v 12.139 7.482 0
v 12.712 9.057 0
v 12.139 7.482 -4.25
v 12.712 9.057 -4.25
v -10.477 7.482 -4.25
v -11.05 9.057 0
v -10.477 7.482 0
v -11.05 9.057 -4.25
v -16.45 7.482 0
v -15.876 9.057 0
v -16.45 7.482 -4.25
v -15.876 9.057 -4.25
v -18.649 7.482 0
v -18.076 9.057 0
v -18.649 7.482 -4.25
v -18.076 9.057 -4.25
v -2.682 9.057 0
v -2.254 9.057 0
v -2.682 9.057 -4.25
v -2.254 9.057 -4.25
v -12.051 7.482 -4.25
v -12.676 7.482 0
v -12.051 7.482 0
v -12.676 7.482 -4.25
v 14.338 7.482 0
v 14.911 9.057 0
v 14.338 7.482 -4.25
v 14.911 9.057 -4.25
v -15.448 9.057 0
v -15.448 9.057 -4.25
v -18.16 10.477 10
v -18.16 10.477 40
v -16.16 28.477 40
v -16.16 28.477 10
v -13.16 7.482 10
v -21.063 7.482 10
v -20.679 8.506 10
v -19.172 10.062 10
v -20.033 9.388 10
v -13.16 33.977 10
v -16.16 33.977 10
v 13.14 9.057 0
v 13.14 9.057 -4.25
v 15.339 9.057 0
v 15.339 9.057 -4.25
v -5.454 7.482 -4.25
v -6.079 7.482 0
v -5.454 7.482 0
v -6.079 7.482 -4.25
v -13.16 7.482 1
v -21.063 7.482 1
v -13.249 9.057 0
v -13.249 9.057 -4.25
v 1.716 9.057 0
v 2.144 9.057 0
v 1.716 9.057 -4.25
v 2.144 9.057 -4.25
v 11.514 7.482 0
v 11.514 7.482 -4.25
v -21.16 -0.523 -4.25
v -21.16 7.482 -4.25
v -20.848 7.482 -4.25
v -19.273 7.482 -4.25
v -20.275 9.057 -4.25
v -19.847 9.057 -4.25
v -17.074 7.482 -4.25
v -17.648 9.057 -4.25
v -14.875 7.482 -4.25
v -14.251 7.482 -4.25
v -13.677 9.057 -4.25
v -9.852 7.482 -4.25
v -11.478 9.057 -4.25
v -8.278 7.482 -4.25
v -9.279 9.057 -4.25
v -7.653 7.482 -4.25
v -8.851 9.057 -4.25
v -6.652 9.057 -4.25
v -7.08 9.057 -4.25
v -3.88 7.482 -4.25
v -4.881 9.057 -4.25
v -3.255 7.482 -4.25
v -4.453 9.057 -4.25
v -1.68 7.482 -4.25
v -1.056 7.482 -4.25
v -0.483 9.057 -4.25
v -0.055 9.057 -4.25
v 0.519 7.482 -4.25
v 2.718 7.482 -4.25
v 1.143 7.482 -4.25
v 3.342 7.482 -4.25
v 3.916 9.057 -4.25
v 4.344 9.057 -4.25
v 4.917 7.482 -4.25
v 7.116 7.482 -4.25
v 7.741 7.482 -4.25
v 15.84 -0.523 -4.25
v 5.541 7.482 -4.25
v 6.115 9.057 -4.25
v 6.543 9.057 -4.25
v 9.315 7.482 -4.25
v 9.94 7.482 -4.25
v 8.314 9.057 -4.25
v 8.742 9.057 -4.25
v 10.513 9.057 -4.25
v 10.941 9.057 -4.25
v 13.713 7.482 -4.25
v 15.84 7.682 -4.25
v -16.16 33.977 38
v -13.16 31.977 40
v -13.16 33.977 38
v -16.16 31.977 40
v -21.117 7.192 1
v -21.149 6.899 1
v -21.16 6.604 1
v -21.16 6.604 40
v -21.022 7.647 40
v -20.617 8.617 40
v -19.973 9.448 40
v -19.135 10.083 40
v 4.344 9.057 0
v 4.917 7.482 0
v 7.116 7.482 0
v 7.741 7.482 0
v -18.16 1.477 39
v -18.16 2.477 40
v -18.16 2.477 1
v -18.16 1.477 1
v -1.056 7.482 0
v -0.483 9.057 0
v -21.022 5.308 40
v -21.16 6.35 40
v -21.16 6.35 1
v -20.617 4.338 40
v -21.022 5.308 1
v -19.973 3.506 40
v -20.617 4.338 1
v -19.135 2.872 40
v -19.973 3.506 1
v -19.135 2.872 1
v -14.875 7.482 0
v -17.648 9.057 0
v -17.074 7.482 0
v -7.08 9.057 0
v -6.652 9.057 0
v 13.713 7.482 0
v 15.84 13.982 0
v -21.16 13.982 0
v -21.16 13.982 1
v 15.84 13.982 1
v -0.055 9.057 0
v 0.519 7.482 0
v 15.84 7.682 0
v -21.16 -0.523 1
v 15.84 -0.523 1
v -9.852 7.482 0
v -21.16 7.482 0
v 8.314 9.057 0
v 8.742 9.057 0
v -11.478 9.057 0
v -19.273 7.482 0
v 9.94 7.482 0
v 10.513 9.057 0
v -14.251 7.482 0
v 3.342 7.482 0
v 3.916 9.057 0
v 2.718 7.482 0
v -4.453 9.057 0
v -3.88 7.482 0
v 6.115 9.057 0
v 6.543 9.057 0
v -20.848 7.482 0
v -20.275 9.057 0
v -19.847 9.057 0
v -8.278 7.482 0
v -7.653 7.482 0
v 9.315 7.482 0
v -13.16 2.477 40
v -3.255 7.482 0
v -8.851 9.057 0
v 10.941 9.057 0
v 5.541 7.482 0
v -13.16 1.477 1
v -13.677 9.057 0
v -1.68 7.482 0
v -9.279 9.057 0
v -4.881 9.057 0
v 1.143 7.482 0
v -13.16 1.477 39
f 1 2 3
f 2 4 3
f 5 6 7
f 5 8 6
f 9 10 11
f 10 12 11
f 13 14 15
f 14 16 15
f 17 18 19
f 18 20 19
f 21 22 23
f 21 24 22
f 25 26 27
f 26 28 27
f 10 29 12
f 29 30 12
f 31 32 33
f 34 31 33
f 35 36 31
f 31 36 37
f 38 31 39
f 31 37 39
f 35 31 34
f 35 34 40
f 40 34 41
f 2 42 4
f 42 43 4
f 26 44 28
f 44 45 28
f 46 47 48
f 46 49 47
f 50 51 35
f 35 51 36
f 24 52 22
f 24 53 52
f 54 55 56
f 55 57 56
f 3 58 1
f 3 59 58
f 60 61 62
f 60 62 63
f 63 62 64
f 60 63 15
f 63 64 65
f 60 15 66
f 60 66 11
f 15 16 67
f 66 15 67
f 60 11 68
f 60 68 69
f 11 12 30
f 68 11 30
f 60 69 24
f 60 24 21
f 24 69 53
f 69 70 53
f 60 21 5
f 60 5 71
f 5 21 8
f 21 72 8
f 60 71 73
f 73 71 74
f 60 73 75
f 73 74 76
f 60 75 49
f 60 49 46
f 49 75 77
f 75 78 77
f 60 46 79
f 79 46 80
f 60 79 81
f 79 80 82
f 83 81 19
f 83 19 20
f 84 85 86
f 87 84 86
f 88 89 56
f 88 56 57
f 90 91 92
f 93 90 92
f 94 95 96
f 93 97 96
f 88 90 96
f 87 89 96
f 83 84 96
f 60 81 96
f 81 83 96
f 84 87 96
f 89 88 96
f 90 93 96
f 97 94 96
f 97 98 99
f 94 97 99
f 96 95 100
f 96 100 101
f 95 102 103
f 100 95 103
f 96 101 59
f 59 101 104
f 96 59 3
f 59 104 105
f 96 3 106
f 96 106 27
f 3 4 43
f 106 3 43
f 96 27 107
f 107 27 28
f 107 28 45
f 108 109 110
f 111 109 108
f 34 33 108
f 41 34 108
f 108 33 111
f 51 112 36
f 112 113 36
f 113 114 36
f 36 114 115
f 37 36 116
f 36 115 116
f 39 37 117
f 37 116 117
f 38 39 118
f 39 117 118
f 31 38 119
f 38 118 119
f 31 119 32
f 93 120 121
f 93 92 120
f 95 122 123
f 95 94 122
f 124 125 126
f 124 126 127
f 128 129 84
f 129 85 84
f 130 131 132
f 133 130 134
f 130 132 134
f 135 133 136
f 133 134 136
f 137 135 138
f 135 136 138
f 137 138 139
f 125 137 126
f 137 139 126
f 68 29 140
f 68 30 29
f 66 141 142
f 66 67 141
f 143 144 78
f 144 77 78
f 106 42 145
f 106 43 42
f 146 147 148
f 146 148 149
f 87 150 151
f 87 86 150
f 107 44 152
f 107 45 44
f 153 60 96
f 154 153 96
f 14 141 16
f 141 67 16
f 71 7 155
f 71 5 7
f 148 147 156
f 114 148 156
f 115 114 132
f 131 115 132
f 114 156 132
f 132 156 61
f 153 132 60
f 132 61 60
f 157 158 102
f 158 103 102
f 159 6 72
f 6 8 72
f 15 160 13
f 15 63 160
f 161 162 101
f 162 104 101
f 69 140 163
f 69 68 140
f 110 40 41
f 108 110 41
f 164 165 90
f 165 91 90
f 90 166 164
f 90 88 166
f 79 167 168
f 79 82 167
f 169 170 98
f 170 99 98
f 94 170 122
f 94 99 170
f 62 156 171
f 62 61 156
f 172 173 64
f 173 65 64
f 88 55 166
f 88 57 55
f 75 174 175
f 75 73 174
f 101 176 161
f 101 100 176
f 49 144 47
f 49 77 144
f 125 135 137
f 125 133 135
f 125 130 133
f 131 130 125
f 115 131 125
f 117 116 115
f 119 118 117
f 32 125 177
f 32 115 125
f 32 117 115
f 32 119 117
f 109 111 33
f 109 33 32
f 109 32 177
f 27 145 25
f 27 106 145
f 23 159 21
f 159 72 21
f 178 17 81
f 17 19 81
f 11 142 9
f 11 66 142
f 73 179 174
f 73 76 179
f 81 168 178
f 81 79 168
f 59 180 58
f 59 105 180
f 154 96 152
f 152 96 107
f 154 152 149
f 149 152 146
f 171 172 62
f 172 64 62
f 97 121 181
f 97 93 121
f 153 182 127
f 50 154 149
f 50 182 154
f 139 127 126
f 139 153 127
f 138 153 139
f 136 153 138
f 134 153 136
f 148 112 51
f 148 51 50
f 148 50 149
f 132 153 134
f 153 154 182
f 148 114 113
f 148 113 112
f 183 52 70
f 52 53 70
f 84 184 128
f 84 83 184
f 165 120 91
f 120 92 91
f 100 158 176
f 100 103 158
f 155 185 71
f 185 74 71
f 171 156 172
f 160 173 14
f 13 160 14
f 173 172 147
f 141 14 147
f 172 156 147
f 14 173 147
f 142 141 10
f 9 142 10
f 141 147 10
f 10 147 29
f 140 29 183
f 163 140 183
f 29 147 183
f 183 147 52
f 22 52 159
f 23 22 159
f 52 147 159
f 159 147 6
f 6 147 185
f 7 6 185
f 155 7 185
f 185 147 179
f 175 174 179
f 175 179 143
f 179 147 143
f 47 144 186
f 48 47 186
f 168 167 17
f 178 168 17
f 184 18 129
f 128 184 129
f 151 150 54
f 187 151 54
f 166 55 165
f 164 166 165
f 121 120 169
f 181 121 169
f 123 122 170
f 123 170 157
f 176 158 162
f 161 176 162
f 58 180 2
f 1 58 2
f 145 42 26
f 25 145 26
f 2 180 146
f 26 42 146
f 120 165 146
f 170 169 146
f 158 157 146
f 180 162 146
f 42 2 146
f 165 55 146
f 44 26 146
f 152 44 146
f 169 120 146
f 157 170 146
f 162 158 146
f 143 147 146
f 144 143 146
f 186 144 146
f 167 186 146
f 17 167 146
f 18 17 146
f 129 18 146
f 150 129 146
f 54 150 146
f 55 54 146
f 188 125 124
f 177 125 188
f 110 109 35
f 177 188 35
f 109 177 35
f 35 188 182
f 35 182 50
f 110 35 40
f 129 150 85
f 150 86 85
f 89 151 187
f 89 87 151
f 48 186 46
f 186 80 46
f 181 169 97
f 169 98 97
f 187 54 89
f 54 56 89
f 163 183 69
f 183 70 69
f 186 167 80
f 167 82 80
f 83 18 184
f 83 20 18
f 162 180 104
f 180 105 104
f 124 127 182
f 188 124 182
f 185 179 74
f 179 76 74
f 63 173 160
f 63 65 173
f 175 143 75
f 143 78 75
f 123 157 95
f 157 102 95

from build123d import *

# Parameters (mm, degrees)
SKETCH1_W           = 37
SKETCH1_H           = 8.005
SKETCH1_H_2         = 6.5
BOSS_EXTRUDE2_DEPTH = 1
BOSS_EXTRUDE3_DEPTH = 39
SKETCH3_W           = 9
SKETCH3_H           = 26.495
CUT_EXTRUDE1_DEPTH  = 65.214183639
SKETCH5_W           = 5
SKETCH5_H           = 5.5
CUT_EXTRUDE2_DEPTH  = 30
FILLET3_R           = 4
CHAMFER1_SIZE       = 2
SKETCH6_W           = 18.033887542
SKETCH6_H           = 50.935114565
CUT_EXTRUDE3_DEPTH  = 1


with BuildPart() as part:
    # <Rack>-<rack spur rectangular_am-5-solid1>: read off the stored shape, not the designer's step
    # <Rack>-<rack spur rectangular_am-5-solid1>: loft between two sections, ruled curve by curve
    rack_rack_spur_rectangular_am_5_solid1_from = [
        Edge.make_line((-44.536254126, 16.385147548, 25.848409668), (-44.964253225, 16.385147548, 25.848409668)),
        Edge.make_line((-46.735368981, 16.385147548, 25.848409668), (-47.16336808, 16.385147548, 25.848409668)),
        Edge.make_line((-48.934483836, 16.385147548, 25.848409668), (-49.362482935, 16.385147548, 25.848409668)),
        Edge.make_line((-51.133598691, 16.385147548, 25.848409668), (-51.56159779, 16.385147548, 25.848409668)),
        Edge.make_line((-53.332713546, 16.385147548, 25.848409668), (-53.760712645, 16.385147548, 25.848409668)),
        Edge.make_line((-55.531828401, 16.385147548, 25.848409668), (-55.9598275, 16.385147548, 25.848409668)),
        Edge.make_line((-57.730943256, 16.385147548, 25.848409668), (-58.158942355, 16.385147548, 25.848409668)),
        Edge.make_line((-59.930058111, 16.385147548, 25.848409668), (-60.35805721, 16.385147548, 25.848409668)),
        Edge.make_line((-62.129172966, 16.385147548, 25.848409668), (-62.557172065, 16.385147548, 25.848409668)),
        Edge.make_line((-64.328287821, 16.385147548, 25.848409668), (-64.75628692, 16.385147548, 25.848409668)),
        Edge.make_line((-66.527402676, 16.385147548, 25.848409668), (-66.955401775, 16.385147548, 25.848409668)),
        Edge.make_line((-68.726517531, 16.385147548, 25.848409668), (-69.15451663, 16.385147548, 25.848409668)),
        Edge.make_line((-70.925632386, 16.385147548, 25.848409668), (-71.353631485, 16.385147548, 25.848409668)),
        Edge.make_line((-73.124747241, 16.385147548, 25.848409668), (-73.55274634, 16.385147548, 25.848409668)),
        Edge.make_line((-75.323862096, 16.385147548, 25.848409668), (-75.751861195, 16.385147548, 25.848409668)),
        Edge.make_line((-77.522976951, 16.385147548, 25.848409668), (-77.95097605, 16.385147548, 25.848409668)),
        Edge.make_line((-78.836533928, 14.810147548, 25.848409668), (-78.836533928, 6.805147548, 25.848409668)),
        Edge.make_line((-42.337139271, 16.385147548, 25.848409668), (-42.76513837, 16.385147548, 25.848409668)),
        Edge.make_line((-41.836533928, 15.009745672, 25.848409668), (-41.836533928, 6.805147548, 25.848409668)),
        Edge.make_line((-78.836533928, 6.805147548, 25.848409668), (-41.836533928, 6.805147548, 25.848409668)),
        Edge.make_line((-77.95097605, 16.385147548, 25.848409668), (-78.524229169, 14.810147548, 25.848409668)),
        Edge.make_line((-78.836533928, 14.810147548, 25.848409668), (-78.524229169, 14.810147548, 25.848409668)),
        Edge.make_line((-77.522976951, 16.385147548, 25.848409668), (-76.949723832, 14.810147548, 25.848409668)),
        Edge.make_line((-75.751861195, 16.385147548, 25.848409668), (-76.325114314, 14.810147548, 25.848409668)),
        Edge.make_line((-76.949723832, 14.810147548, 25.848409668), (-76.325114314, 14.810147548, 25.848409668)),
        Edge.make_line((-75.323862096, 16.385147548, 25.848409668), (-74.750608977, 14.810147548, 25.848409668)),
        Edge.make_line((-73.55274634, 16.385147548, 25.848409668), (-74.125999459, 14.810147548, 25.848409668)),
        Edge.make_line((-74.750608977, 14.810147548, 25.848409668), (-74.125999459, 14.810147548, 25.848409668)),
        Edge.make_line((-73.124747241, 16.385147548, 25.848409668), (-72.551494122, 14.810147548, 25.848409668)),
        Edge.make_line((-71.353631485, 16.385147548, 25.848409668), (-71.926884604, 14.810147548, 25.848409668)),
        Edge.make_line((-72.551494122, 14.810147548, 25.848409668), (-71.926884604, 14.810147548, 25.848409668)),
        Edge.make_line((-70.925632386, 16.385147548, 25.848409668), (-70.352379267, 14.810147548, 25.848409668)),
        Edge.make_line((-69.15451663, 16.385147548, 25.848409668), (-69.727769749, 14.810147548, 25.848409668)),
        Edge.make_line((-70.352379267, 14.810147548, 25.848409668), (-69.727769749, 14.810147548, 25.848409668)),
        Edge.make_line((-68.726517531, 16.385147548, 25.848409668), (-68.153264412, 14.810147548, 25.848409668)),
        Edge.make_line((-66.955401775, 16.385147548, 25.848409668), (-67.528654894, 14.810147548, 25.848409668)),
        Edge.make_line((-68.153264412, 14.810147548, 25.848409668), (-67.528654894, 14.810147548, 25.848409668)),
        Edge.make_line((-66.527402676, 16.385147548, 25.848409668), (-65.954149557, 14.810147548, 25.848409668)),
        Edge.make_line((-64.75628692, 16.385147548, 25.848409668), (-65.329540039, 14.810147548, 25.848409668)),
        Edge.make_line((-65.954149557, 14.810147548, 25.848409668), (-65.329540039, 14.810147548, 25.848409668)),
        Edge.make_line((-64.328287821, 16.385147548, 25.848409668), (-63.755034702, 14.810147548, 25.848409668)),
        Edge.make_line((-62.557172065, 16.385147548, 25.848409668), (-63.130425184, 14.810147548, 25.848409668)),
        Edge.make_line((-63.755034702, 14.810147548, 25.848409668), (-63.130425184, 14.810147548, 25.848409668)),
        Edge.make_line((-62.129172966, 16.385147548, 25.848409668), (-61.555919847, 14.810147548, 25.848409668)),
        Edge.make_line((-60.35805721, 16.385147548, 25.848409668), (-60.931310329, 14.810147548, 25.848409668)),
        Edge.make_line((-61.555919847, 14.810147548, 25.848409668), (-60.931310329, 14.810147548, 25.848409668)),
        Edge.make_line((-59.930058111, 16.385147548, 25.848409668), (-59.356804992, 14.810147548, 25.848409668)),
        Edge.make_line((-58.158942355, 16.385147548, 25.848409668), (-58.732195474, 14.810147548, 25.848409668)),
        Edge.make_line((-59.356804992, 14.810147548, 25.848409668), (-58.732195474, 14.810147548, 25.848409668)),
        Edge.make_line((-57.730943256, 16.385147548, 25.848409668), (-57.157690137, 14.810147548, 25.848409668)),
        Edge.make_line((-55.9598275, 16.385147548, 25.848409668), (-56.533080619, 14.810147548, 25.848409668)),
        Edge.make_line((-57.157690137, 14.810147548, 25.848409668), (-56.533080619, 14.810147548, 25.848409668)),
        Edge.make_line((-55.531828401, 16.385147548, 25.848409668), (-54.958575282, 14.810147548, 25.848409668)),
        Edge.make_line((-53.760712645, 16.385147548, 25.848409668), (-54.333965764, 14.810147548, 25.848409668)),
        Edge.make_line((-54.958575282, 14.810147548, 25.848409668), (-54.333965764, 14.810147548, 25.848409668)),
        Edge.make_line((-53.332713546, 16.385147548, 25.848409668), (-52.759460427, 14.810147548, 25.848409668)),
        Edge.make_line((-51.56159779, 16.385147548, 25.848409668), (-52.134850909, 14.810147548, 25.848409668)),
        Edge.make_line((-52.759460427, 14.810147548, 25.848409668), (-52.134850909, 14.810147548, 25.848409668)),
        Edge.make_line((-51.133598691, 16.385147548, 25.848409668), (-50.560345572, 14.810147548, 25.848409668)),
        Edge.make_line((-49.362482935, 16.385147548, 25.848409668), (-49.935736054, 14.810147548, 25.848409668)),
        Edge.make_line((-50.560345572, 14.810147548, 25.848409668), (-49.935736054, 14.810147548, 25.848409668)),
        Edge.make_line((-48.934483836, 16.385147548, 25.848409668), (-48.361230717, 14.810147548, 25.848409668)),
        Edge.make_line((-47.16336808, 16.385147548, 25.848409668), (-47.736621199, 14.810147548, 25.848409668)),
        Edge.make_line((-48.361230717, 14.810147548, 25.848409668), (-47.736621199, 14.810147548, 25.848409668)),
        Edge.make_line((-46.735368981, 16.385147548, 25.848409668), (-46.162115862, 14.810147548, 25.848409668)),
        Edge.make_line((-44.964253225, 16.385147548, 25.848409668), (-45.537506344, 14.810147548, 25.848409668)),
        Edge.make_line((-46.162115862, 14.810147548, 25.848409668), (-45.537506344, 14.810147548, 25.848409668)),
        Edge.make_line((-44.536254126, 16.385147548, 25.848409668), (-43.963001007, 14.810147548, 25.848409668)),
        Edge.make_line((-42.76513837, 16.385147548, 25.848409668), (-43.338391489, 14.810147548, 25.848409668)),
        Edge.make_line((-43.963001007, 14.810147548, 25.848409668), (-43.338391489, 14.810147548, 25.848409668)),
        Edge.make_line((-42.337139271, 16.385147548, 25.848409668), (-41.836533928, 15.009745672, 25.848409668)),
    ]
    rack_rack_spur_rectangular_am_5_solid1_to = [
        Edge.make_line((-44.536254126, 16.385147548, 21.598409668), (-44.964253225, 16.385147548, 21.598409668)),
        Edge.make_line((-46.735368981, 16.385147548, 21.598409668), (-47.16336808, 16.385147548, 21.598409668)),
        Edge.make_line((-48.934483836, 16.385147548, 21.598409668), (-49.362482935, 16.385147548, 21.598409668)),
        Edge.make_line((-51.133598691, 16.385147548, 21.598409668), (-51.56159779, 16.385147548, 21.598409668)),
        Edge.make_line((-53.332713546, 16.385147548, 21.598409668), (-53.760712645, 16.385147548, 21.598409668)),
        Edge.make_line((-55.531828401, 16.385147548, 21.598409668), (-55.9598275, 16.385147548, 21.598409668)),
        Edge.make_line((-57.730943256, 16.385147548, 21.598409668), (-58.158942355, 16.385147548, 21.598409668)),
        Edge.make_line((-59.930058111, 16.385147548, 21.598409668), (-60.35805721, 16.385147548, 21.598409668)),
        Edge.make_line((-62.129172966, 16.385147548, 21.598409668), (-62.557172065, 16.385147548, 21.598409668)),
        Edge.make_line((-64.328287821, 16.385147548, 21.598409668), (-64.75628692, 16.385147548, 21.598409668)),
        Edge.make_line((-66.527402676, 16.385147548, 21.598409668), (-66.955401775, 16.385147548, 21.598409668)),
        Edge.make_line((-68.726517531, 16.385147548, 21.598409668), (-69.15451663, 16.385147548, 21.598409668)),
        Edge.make_line((-70.925632386, 16.385147548, 21.598409668), (-71.353631485, 16.385147548, 21.598409668)),
        Edge.make_line((-73.124747241, 16.385147548, 21.598409668), (-73.55274634, 16.385147548, 21.598409668)),
        Edge.make_line((-75.323862096, 16.385147548, 21.598409668), (-75.751861195, 16.385147548, 21.598409668)),
        Edge.make_line((-77.522976951, 16.385147548, 21.598409668), (-77.95097605, 16.385147548, 21.598409668)),
        Edge.make_line((-78.836533928, 14.810147548, 21.598409668), (-78.836533928, 6.805147548, 21.598409668)),
        Edge.make_line((-42.337139271, 16.385147548, 21.598409668), (-42.76513837, 16.385147548, 21.598409668)),
        Edge.make_line((-41.836533928, 15.009745672, 21.598409668), (-41.836533928, 6.805147548, 21.598409668)),
        Edge.make_line((-78.836533928, 6.805147548, 21.598409668), (-41.836533928, 6.805147548, 21.598409668)),
        Edge.make_line((-77.95097605, 16.385147548, 21.598409668), (-78.524229169, 14.810147548, 21.598409668)),
        Edge.make_line((-78.836533928, 14.810147548, 21.598409668), (-78.524229169, 14.810147548, 21.598409668)),
        Edge.make_line((-77.522976951, 16.385147548, 21.598409668), (-76.949723832, 14.810147548, 21.598409668)),
        Edge.make_line((-75.751861195, 16.385147548, 21.598409668), (-76.325114314, 14.810147548, 21.598409668)),
        Edge.make_line((-76.949723832, 14.810147548, 21.598409668), (-76.325114314, 14.810147548, 21.598409668)),
        Edge.make_line((-75.323862096, 16.385147548, 21.598409668), (-74.750608977, 14.810147548, 21.598409668)),
        Edge.make_line((-73.55274634, 16.385147548, 21.598409668), (-74.125999459, 14.810147548, 21.598409668)),
        Edge.make_line((-74.750608977, 14.810147548, 21.598409668), (-74.125999459, 14.810147548, 21.598409668)),
        Edge.make_line((-73.124747241, 16.385147548, 21.598409668), (-72.551494122, 14.810147548, 21.598409668)),
        Edge.make_line((-71.353631485, 16.385147548, 21.598409668), (-71.926884604, 14.810147548, 21.598409668)),
        Edge.make_line((-72.551494122, 14.810147548, 21.598409668), (-71.926884604, 14.810147548, 21.598409668)),
        Edge.make_line((-70.925632386, 16.385147548, 21.598409668), (-70.352379267, 14.810147548, 21.598409668)),
        Edge.make_line((-69.15451663, 16.385147548, 21.598409668), (-69.727769749, 14.810147548, 21.598409668)),
        Edge.make_line((-70.352379267, 14.810147548, 21.598409668), (-69.727769749, 14.810147548, 21.598409668)),
        Edge.make_line((-68.726517531, 16.385147548, 21.598409668), (-68.153264412, 14.810147548, 21.598409668)),
        Edge.make_line((-66.955401775, 16.385147548, 21.598409668), (-67.528654894, 14.810147548, 21.598409668)),
        Edge.make_line((-68.153264412, 14.810147548, 21.598409668), (-67.528654894, 14.810147548, 21.598409668)),
        Edge.make_line((-66.527402676, 16.385147548, 21.598409668), (-65.954149557, 14.810147548, 21.598409668)),
        Edge.make_line((-64.75628692, 16.385147548, 21.598409668), (-65.329540039, 14.810147548, 21.598409668)),
        Edge.make_line((-65.954149557, 14.810147548, 21.598409668), (-65.329540039, 14.810147548, 21.598409668)),
        Edge.make_line((-64.328287821, 16.385147548, 21.598409668), (-63.755034702, 14.810147548, 21.598409668)),
        Edge.make_line((-62.557172065, 16.385147548, 21.598409668), (-63.130425184, 14.810147548, 21.598409668)),
        Edge.make_line((-63.755034702, 14.810147548, 21.598409668), (-63.130425184, 14.810147548, 21.598409668)),
        Edge.make_line((-62.129172966, 16.385147548, 21.598409668), (-61.555919847, 14.810147548, 21.598409668)),
        Edge.make_line((-60.35805721, 16.385147548, 21.598409668), (-60.931310329, 14.810147548, 21.598409668)),
        Edge.make_line((-61.555919847, 14.810147548, 21.598409668), (-60.931310329, 14.810147548, 21.598409668)),
        Edge.make_line((-59.930058111, 16.385147548, 21.598409668), (-59.356804992, 14.810147548, 21.598409668)),
        Edge.make_line((-58.158942355, 16.385147548, 21.598409668), (-58.732195474, 14.810147548, 21.598409668)),
        Edge.make_line((-59.356804992, 14.810147548, 21.598409668), (-58.732195474, 14.810147548, 21.598409668)),
        Edge.make_line((-57.730943256, 16.385147548, 21.598409668), (-57.157690137, 14.810147548, 21.598409668)),
        Edge.make_line((-55.9598275, 16.385147548, 21.598409668), (-56.533080619, 14.810147548, 21.598409668)),
        Edge.make_line((-57.157690137, 14.810147548, 21.598409668), (-56.533080619, 14.810147548, 21.598409668)),
        Edge.make_line((-55.531828401, 16.385147548, 21.598409668), (-54.958575282, 14.810147548, 21.598409668)),
        Edge.make_line((-53.760712645, 16.385147548, 21.598409668), (-54.333965764, 14.810147548, 21.598409668)),
        Edge.make_line((-54.958575282, 14.810147548, 21.598409668), (-54.333965764, 14.810147548, 21.598409668)),
        Edge.make_line((-53.332713546, 16.385147548, 21.598409668), (-52.759460427, 14.810147548, 21.598409668)),
        Edge.make_line((-51.56159779, 16.385147548, 21.598409668), (-52.134850909, 14.810147548, 21.598409668)),
        Edge.make_line((-52.759460427, 14.810147548, 21.598409668), (-52.134850909, 14.810147548, 21.598409668)),
        Edge.make_line((-51.133598691, 16.385147548, 21.598409668), (-50.560345572, 14.810147548, 21.598409668)),
        Edge.make_line((-49.362482935, 16.385147548, 21.598409668), (-49.935736054, 14.810147548, 21.598409668)),
        Edge.make_line((-50.560345572, 14.810147548, 21.598409668), (-49.935736054, 14.810147548, 21.598409668)),
        Edge.make_line((-48.934483836, 16.385147548, 21.598409668), (-48.361230717, 14.810147548, 21.598409668)),
        Edge.make_line((-47.16336808, 16.385147548, 21.598409668), (-47.736621199, 14.810147548, 21.598409668)),
        Edge.make_line((-48.361230717, 14.810147548, 21.598409668), (-47.736621199, 14.810147548, 21.598409668)),
        Edge.make_line((-46.735368981, 16.385147548, 21.598409668), (-46.162115862, 14.810147548, 21.598409668)),
        Edge.make_line((-44.964253225, 16.385147548, 21.598409668), (-45.537506344, 14.810147548, 21.598409668)),
        Edge.make_line((-46.162115862, 14.810147548, 21.598409668), (-45.537506344, 14.810147548, 21.598409668)),
        Edge.make_line((-44.536254126, 16.385147548, 21.598409668), (-43.963001007, 14.810147548, 21.598409668)),
        Edge.make_line((-42.76513837, 16.385147548, 21.598409668), (-43.338391489, 14.810147548, 21.598409668)),
        Edge.make_line((-43.963001007, 14.810147548, 21.598409668), (-43.338391489, 14.810147548, 21.598409668)),
        Edge.make_line((-42.337139271, 16.385147548, 21.598409668), (-41.836533928, 15.009745672, 21.598409668)),
    ]
    rack_rack_spur_rectangular_am_5_solid1 = Solid(Shell([*[Face.make_surface_from_curves(rack_rack_spur_rectangular_am_5_solid1_from[k], rack_rack_spur_rectangular_am_5_solid1_to[k]) for k in range(71)], Face(Wire(rack_rack_spur_rectangular_am_5_solid1_from)), Face(Wire(rack_rack_spur_rectangular_am_5_solid1_to))]))
    add(rack_rack_spur_rectangular_am_5_solid1)


with BuildPart() as part_1:
    # Rack: read off the stored shape, not the designer's step
    # Rack: moved
    add(part.part.moved(Location((57.6763086, -7.3277822, -25.8484097))))

    # Sketch1 → Boss-Extrude2 (add)
    with BuildSketch(Plane.XY):
        with Locations((-2.66022528, 3.47986538)):
            Rectangle(SKETCH1_W, SKETCH1_H)
        with Locations((-2.66022528, 10.73236538)):
            Rectangle(SKETCH1_W, SKETCH1_H_2)
    extrude(amount=BOSS_EXTRUDE2_DEPTH)

    # Sketch2 → Boss-Extrude3 (add)
    with BuildSketch(Plane.XY.offset(1)):
        Polygon((-21.16022528, 33.97736538), (-21.16022528, 2.47736538), (-18.16022528, 2.47736538), (-18.16022528, 0.47736538), (-13.16022528, 0.47736538), (-13.16022528, 33.97736538), align=None)
    extrude(amount=BOSS_EXTRUDE3_DEPTH)

    # Sketch3 → Cut-Extrude1 (cut, through all)
    with BuildSketch(Plane.ZY.offset(21.16022528)):
        with Locations((5.5, 20.72986538)):
            Rectangle(SKETCH3_W, SKETCH3_H)
    extrude(amount=-CUT_EXTRUDE1_DEPTH, mode=Mode.SUBTRACT)

    # Sketch5 → Cut-Extrude2 (cut)
    with BuildSketch(Plane.XY.offset(40)):
        with Locations((-18.66022528, 31.22736538)):
            Rectangle(SKETCH5_W, SKETCH5_H)
        Polygon((-21.16022528, 28.47736538), (-21.16022528, 10.47736538), (-18.16022528, 10.47736538), (-16.16022528, 28.47736538), align=None)
    extrude(amount=-CUT_EXTRUDE2_DEPTH, mode=Mode.SUBTRACT)

    # Fillet3
    # the kernel refuses this fillet: 4 mm, written as the material it takes off along each edge
    with BuildSketch(Plane(origin=(-21.16022528, 2.47736538, 1), x_dir=(0, 1, 0), z_dir=(0, 0, 1))) as fillet3_piece_1:
        with BuildLine():
            CenterArc((3.872983346, -4), FILLET3_R, 90, 75.522487814)
            Line((0, -3), (0, 0))
            Line((0, 0), (3.872983346, 0))
        make_face()
    extrude(amount=48.682458366, mode=Mode.SUBTRACT)
    with BuildSketch(Plane(origin=(-21.16022528, 10.47736538, 49.682458366), x_dir=(0, -1, 0), z_dir=(0, 0, -1))) as fillet3_piece_2_section:
        with BuildLine():
            CenterArc((3.872983346, -4), FILLET3_R, 90, 75.522487814)
            Line((0, -3), (0, 0))
            Line((0, 0), (3.872983346, 0))
        make_face()
    fillet3_piece_2 = extrude(amount=49.364916731, mode=Mode.PRIVATE)
    fillet3_piece_2 = split(fillet3_piece_2, bisect_by=Plane(origin=(-21.16022528, 10.47736538, 1), z_dir=(0, 0, 1)), keep=Keep.TOP, mode=Mode.PRIVATE)
    add(fillet3_piece_2, mode=Mode.SUBTRACT)

    # Chamfer1
    chamfer1_edges = [part_1.edges().sort_by_distance(p)[0] for p in [
        (-15.66022528, 0.47736538, 40),
        (-14.66022528, 33.97736538, 40),
    ]]
    chamfer(chamfer1_edges, length=CHAMFER1_SIZE)

    # Sketch6 → Cut-Extrude3 (cut)
    with BuildSketch(Plane.XZ.offset(-0.47736538)):
        with Locations((-16.99836785, 26.467557283)):
            Rectangle(SKETCH6_W, SKETCH6_H)
    extrude(amount=-CUT_EXTRUDE3_DEPTH, mode=Mode.SUBTRACT)


solid = part_1.part
